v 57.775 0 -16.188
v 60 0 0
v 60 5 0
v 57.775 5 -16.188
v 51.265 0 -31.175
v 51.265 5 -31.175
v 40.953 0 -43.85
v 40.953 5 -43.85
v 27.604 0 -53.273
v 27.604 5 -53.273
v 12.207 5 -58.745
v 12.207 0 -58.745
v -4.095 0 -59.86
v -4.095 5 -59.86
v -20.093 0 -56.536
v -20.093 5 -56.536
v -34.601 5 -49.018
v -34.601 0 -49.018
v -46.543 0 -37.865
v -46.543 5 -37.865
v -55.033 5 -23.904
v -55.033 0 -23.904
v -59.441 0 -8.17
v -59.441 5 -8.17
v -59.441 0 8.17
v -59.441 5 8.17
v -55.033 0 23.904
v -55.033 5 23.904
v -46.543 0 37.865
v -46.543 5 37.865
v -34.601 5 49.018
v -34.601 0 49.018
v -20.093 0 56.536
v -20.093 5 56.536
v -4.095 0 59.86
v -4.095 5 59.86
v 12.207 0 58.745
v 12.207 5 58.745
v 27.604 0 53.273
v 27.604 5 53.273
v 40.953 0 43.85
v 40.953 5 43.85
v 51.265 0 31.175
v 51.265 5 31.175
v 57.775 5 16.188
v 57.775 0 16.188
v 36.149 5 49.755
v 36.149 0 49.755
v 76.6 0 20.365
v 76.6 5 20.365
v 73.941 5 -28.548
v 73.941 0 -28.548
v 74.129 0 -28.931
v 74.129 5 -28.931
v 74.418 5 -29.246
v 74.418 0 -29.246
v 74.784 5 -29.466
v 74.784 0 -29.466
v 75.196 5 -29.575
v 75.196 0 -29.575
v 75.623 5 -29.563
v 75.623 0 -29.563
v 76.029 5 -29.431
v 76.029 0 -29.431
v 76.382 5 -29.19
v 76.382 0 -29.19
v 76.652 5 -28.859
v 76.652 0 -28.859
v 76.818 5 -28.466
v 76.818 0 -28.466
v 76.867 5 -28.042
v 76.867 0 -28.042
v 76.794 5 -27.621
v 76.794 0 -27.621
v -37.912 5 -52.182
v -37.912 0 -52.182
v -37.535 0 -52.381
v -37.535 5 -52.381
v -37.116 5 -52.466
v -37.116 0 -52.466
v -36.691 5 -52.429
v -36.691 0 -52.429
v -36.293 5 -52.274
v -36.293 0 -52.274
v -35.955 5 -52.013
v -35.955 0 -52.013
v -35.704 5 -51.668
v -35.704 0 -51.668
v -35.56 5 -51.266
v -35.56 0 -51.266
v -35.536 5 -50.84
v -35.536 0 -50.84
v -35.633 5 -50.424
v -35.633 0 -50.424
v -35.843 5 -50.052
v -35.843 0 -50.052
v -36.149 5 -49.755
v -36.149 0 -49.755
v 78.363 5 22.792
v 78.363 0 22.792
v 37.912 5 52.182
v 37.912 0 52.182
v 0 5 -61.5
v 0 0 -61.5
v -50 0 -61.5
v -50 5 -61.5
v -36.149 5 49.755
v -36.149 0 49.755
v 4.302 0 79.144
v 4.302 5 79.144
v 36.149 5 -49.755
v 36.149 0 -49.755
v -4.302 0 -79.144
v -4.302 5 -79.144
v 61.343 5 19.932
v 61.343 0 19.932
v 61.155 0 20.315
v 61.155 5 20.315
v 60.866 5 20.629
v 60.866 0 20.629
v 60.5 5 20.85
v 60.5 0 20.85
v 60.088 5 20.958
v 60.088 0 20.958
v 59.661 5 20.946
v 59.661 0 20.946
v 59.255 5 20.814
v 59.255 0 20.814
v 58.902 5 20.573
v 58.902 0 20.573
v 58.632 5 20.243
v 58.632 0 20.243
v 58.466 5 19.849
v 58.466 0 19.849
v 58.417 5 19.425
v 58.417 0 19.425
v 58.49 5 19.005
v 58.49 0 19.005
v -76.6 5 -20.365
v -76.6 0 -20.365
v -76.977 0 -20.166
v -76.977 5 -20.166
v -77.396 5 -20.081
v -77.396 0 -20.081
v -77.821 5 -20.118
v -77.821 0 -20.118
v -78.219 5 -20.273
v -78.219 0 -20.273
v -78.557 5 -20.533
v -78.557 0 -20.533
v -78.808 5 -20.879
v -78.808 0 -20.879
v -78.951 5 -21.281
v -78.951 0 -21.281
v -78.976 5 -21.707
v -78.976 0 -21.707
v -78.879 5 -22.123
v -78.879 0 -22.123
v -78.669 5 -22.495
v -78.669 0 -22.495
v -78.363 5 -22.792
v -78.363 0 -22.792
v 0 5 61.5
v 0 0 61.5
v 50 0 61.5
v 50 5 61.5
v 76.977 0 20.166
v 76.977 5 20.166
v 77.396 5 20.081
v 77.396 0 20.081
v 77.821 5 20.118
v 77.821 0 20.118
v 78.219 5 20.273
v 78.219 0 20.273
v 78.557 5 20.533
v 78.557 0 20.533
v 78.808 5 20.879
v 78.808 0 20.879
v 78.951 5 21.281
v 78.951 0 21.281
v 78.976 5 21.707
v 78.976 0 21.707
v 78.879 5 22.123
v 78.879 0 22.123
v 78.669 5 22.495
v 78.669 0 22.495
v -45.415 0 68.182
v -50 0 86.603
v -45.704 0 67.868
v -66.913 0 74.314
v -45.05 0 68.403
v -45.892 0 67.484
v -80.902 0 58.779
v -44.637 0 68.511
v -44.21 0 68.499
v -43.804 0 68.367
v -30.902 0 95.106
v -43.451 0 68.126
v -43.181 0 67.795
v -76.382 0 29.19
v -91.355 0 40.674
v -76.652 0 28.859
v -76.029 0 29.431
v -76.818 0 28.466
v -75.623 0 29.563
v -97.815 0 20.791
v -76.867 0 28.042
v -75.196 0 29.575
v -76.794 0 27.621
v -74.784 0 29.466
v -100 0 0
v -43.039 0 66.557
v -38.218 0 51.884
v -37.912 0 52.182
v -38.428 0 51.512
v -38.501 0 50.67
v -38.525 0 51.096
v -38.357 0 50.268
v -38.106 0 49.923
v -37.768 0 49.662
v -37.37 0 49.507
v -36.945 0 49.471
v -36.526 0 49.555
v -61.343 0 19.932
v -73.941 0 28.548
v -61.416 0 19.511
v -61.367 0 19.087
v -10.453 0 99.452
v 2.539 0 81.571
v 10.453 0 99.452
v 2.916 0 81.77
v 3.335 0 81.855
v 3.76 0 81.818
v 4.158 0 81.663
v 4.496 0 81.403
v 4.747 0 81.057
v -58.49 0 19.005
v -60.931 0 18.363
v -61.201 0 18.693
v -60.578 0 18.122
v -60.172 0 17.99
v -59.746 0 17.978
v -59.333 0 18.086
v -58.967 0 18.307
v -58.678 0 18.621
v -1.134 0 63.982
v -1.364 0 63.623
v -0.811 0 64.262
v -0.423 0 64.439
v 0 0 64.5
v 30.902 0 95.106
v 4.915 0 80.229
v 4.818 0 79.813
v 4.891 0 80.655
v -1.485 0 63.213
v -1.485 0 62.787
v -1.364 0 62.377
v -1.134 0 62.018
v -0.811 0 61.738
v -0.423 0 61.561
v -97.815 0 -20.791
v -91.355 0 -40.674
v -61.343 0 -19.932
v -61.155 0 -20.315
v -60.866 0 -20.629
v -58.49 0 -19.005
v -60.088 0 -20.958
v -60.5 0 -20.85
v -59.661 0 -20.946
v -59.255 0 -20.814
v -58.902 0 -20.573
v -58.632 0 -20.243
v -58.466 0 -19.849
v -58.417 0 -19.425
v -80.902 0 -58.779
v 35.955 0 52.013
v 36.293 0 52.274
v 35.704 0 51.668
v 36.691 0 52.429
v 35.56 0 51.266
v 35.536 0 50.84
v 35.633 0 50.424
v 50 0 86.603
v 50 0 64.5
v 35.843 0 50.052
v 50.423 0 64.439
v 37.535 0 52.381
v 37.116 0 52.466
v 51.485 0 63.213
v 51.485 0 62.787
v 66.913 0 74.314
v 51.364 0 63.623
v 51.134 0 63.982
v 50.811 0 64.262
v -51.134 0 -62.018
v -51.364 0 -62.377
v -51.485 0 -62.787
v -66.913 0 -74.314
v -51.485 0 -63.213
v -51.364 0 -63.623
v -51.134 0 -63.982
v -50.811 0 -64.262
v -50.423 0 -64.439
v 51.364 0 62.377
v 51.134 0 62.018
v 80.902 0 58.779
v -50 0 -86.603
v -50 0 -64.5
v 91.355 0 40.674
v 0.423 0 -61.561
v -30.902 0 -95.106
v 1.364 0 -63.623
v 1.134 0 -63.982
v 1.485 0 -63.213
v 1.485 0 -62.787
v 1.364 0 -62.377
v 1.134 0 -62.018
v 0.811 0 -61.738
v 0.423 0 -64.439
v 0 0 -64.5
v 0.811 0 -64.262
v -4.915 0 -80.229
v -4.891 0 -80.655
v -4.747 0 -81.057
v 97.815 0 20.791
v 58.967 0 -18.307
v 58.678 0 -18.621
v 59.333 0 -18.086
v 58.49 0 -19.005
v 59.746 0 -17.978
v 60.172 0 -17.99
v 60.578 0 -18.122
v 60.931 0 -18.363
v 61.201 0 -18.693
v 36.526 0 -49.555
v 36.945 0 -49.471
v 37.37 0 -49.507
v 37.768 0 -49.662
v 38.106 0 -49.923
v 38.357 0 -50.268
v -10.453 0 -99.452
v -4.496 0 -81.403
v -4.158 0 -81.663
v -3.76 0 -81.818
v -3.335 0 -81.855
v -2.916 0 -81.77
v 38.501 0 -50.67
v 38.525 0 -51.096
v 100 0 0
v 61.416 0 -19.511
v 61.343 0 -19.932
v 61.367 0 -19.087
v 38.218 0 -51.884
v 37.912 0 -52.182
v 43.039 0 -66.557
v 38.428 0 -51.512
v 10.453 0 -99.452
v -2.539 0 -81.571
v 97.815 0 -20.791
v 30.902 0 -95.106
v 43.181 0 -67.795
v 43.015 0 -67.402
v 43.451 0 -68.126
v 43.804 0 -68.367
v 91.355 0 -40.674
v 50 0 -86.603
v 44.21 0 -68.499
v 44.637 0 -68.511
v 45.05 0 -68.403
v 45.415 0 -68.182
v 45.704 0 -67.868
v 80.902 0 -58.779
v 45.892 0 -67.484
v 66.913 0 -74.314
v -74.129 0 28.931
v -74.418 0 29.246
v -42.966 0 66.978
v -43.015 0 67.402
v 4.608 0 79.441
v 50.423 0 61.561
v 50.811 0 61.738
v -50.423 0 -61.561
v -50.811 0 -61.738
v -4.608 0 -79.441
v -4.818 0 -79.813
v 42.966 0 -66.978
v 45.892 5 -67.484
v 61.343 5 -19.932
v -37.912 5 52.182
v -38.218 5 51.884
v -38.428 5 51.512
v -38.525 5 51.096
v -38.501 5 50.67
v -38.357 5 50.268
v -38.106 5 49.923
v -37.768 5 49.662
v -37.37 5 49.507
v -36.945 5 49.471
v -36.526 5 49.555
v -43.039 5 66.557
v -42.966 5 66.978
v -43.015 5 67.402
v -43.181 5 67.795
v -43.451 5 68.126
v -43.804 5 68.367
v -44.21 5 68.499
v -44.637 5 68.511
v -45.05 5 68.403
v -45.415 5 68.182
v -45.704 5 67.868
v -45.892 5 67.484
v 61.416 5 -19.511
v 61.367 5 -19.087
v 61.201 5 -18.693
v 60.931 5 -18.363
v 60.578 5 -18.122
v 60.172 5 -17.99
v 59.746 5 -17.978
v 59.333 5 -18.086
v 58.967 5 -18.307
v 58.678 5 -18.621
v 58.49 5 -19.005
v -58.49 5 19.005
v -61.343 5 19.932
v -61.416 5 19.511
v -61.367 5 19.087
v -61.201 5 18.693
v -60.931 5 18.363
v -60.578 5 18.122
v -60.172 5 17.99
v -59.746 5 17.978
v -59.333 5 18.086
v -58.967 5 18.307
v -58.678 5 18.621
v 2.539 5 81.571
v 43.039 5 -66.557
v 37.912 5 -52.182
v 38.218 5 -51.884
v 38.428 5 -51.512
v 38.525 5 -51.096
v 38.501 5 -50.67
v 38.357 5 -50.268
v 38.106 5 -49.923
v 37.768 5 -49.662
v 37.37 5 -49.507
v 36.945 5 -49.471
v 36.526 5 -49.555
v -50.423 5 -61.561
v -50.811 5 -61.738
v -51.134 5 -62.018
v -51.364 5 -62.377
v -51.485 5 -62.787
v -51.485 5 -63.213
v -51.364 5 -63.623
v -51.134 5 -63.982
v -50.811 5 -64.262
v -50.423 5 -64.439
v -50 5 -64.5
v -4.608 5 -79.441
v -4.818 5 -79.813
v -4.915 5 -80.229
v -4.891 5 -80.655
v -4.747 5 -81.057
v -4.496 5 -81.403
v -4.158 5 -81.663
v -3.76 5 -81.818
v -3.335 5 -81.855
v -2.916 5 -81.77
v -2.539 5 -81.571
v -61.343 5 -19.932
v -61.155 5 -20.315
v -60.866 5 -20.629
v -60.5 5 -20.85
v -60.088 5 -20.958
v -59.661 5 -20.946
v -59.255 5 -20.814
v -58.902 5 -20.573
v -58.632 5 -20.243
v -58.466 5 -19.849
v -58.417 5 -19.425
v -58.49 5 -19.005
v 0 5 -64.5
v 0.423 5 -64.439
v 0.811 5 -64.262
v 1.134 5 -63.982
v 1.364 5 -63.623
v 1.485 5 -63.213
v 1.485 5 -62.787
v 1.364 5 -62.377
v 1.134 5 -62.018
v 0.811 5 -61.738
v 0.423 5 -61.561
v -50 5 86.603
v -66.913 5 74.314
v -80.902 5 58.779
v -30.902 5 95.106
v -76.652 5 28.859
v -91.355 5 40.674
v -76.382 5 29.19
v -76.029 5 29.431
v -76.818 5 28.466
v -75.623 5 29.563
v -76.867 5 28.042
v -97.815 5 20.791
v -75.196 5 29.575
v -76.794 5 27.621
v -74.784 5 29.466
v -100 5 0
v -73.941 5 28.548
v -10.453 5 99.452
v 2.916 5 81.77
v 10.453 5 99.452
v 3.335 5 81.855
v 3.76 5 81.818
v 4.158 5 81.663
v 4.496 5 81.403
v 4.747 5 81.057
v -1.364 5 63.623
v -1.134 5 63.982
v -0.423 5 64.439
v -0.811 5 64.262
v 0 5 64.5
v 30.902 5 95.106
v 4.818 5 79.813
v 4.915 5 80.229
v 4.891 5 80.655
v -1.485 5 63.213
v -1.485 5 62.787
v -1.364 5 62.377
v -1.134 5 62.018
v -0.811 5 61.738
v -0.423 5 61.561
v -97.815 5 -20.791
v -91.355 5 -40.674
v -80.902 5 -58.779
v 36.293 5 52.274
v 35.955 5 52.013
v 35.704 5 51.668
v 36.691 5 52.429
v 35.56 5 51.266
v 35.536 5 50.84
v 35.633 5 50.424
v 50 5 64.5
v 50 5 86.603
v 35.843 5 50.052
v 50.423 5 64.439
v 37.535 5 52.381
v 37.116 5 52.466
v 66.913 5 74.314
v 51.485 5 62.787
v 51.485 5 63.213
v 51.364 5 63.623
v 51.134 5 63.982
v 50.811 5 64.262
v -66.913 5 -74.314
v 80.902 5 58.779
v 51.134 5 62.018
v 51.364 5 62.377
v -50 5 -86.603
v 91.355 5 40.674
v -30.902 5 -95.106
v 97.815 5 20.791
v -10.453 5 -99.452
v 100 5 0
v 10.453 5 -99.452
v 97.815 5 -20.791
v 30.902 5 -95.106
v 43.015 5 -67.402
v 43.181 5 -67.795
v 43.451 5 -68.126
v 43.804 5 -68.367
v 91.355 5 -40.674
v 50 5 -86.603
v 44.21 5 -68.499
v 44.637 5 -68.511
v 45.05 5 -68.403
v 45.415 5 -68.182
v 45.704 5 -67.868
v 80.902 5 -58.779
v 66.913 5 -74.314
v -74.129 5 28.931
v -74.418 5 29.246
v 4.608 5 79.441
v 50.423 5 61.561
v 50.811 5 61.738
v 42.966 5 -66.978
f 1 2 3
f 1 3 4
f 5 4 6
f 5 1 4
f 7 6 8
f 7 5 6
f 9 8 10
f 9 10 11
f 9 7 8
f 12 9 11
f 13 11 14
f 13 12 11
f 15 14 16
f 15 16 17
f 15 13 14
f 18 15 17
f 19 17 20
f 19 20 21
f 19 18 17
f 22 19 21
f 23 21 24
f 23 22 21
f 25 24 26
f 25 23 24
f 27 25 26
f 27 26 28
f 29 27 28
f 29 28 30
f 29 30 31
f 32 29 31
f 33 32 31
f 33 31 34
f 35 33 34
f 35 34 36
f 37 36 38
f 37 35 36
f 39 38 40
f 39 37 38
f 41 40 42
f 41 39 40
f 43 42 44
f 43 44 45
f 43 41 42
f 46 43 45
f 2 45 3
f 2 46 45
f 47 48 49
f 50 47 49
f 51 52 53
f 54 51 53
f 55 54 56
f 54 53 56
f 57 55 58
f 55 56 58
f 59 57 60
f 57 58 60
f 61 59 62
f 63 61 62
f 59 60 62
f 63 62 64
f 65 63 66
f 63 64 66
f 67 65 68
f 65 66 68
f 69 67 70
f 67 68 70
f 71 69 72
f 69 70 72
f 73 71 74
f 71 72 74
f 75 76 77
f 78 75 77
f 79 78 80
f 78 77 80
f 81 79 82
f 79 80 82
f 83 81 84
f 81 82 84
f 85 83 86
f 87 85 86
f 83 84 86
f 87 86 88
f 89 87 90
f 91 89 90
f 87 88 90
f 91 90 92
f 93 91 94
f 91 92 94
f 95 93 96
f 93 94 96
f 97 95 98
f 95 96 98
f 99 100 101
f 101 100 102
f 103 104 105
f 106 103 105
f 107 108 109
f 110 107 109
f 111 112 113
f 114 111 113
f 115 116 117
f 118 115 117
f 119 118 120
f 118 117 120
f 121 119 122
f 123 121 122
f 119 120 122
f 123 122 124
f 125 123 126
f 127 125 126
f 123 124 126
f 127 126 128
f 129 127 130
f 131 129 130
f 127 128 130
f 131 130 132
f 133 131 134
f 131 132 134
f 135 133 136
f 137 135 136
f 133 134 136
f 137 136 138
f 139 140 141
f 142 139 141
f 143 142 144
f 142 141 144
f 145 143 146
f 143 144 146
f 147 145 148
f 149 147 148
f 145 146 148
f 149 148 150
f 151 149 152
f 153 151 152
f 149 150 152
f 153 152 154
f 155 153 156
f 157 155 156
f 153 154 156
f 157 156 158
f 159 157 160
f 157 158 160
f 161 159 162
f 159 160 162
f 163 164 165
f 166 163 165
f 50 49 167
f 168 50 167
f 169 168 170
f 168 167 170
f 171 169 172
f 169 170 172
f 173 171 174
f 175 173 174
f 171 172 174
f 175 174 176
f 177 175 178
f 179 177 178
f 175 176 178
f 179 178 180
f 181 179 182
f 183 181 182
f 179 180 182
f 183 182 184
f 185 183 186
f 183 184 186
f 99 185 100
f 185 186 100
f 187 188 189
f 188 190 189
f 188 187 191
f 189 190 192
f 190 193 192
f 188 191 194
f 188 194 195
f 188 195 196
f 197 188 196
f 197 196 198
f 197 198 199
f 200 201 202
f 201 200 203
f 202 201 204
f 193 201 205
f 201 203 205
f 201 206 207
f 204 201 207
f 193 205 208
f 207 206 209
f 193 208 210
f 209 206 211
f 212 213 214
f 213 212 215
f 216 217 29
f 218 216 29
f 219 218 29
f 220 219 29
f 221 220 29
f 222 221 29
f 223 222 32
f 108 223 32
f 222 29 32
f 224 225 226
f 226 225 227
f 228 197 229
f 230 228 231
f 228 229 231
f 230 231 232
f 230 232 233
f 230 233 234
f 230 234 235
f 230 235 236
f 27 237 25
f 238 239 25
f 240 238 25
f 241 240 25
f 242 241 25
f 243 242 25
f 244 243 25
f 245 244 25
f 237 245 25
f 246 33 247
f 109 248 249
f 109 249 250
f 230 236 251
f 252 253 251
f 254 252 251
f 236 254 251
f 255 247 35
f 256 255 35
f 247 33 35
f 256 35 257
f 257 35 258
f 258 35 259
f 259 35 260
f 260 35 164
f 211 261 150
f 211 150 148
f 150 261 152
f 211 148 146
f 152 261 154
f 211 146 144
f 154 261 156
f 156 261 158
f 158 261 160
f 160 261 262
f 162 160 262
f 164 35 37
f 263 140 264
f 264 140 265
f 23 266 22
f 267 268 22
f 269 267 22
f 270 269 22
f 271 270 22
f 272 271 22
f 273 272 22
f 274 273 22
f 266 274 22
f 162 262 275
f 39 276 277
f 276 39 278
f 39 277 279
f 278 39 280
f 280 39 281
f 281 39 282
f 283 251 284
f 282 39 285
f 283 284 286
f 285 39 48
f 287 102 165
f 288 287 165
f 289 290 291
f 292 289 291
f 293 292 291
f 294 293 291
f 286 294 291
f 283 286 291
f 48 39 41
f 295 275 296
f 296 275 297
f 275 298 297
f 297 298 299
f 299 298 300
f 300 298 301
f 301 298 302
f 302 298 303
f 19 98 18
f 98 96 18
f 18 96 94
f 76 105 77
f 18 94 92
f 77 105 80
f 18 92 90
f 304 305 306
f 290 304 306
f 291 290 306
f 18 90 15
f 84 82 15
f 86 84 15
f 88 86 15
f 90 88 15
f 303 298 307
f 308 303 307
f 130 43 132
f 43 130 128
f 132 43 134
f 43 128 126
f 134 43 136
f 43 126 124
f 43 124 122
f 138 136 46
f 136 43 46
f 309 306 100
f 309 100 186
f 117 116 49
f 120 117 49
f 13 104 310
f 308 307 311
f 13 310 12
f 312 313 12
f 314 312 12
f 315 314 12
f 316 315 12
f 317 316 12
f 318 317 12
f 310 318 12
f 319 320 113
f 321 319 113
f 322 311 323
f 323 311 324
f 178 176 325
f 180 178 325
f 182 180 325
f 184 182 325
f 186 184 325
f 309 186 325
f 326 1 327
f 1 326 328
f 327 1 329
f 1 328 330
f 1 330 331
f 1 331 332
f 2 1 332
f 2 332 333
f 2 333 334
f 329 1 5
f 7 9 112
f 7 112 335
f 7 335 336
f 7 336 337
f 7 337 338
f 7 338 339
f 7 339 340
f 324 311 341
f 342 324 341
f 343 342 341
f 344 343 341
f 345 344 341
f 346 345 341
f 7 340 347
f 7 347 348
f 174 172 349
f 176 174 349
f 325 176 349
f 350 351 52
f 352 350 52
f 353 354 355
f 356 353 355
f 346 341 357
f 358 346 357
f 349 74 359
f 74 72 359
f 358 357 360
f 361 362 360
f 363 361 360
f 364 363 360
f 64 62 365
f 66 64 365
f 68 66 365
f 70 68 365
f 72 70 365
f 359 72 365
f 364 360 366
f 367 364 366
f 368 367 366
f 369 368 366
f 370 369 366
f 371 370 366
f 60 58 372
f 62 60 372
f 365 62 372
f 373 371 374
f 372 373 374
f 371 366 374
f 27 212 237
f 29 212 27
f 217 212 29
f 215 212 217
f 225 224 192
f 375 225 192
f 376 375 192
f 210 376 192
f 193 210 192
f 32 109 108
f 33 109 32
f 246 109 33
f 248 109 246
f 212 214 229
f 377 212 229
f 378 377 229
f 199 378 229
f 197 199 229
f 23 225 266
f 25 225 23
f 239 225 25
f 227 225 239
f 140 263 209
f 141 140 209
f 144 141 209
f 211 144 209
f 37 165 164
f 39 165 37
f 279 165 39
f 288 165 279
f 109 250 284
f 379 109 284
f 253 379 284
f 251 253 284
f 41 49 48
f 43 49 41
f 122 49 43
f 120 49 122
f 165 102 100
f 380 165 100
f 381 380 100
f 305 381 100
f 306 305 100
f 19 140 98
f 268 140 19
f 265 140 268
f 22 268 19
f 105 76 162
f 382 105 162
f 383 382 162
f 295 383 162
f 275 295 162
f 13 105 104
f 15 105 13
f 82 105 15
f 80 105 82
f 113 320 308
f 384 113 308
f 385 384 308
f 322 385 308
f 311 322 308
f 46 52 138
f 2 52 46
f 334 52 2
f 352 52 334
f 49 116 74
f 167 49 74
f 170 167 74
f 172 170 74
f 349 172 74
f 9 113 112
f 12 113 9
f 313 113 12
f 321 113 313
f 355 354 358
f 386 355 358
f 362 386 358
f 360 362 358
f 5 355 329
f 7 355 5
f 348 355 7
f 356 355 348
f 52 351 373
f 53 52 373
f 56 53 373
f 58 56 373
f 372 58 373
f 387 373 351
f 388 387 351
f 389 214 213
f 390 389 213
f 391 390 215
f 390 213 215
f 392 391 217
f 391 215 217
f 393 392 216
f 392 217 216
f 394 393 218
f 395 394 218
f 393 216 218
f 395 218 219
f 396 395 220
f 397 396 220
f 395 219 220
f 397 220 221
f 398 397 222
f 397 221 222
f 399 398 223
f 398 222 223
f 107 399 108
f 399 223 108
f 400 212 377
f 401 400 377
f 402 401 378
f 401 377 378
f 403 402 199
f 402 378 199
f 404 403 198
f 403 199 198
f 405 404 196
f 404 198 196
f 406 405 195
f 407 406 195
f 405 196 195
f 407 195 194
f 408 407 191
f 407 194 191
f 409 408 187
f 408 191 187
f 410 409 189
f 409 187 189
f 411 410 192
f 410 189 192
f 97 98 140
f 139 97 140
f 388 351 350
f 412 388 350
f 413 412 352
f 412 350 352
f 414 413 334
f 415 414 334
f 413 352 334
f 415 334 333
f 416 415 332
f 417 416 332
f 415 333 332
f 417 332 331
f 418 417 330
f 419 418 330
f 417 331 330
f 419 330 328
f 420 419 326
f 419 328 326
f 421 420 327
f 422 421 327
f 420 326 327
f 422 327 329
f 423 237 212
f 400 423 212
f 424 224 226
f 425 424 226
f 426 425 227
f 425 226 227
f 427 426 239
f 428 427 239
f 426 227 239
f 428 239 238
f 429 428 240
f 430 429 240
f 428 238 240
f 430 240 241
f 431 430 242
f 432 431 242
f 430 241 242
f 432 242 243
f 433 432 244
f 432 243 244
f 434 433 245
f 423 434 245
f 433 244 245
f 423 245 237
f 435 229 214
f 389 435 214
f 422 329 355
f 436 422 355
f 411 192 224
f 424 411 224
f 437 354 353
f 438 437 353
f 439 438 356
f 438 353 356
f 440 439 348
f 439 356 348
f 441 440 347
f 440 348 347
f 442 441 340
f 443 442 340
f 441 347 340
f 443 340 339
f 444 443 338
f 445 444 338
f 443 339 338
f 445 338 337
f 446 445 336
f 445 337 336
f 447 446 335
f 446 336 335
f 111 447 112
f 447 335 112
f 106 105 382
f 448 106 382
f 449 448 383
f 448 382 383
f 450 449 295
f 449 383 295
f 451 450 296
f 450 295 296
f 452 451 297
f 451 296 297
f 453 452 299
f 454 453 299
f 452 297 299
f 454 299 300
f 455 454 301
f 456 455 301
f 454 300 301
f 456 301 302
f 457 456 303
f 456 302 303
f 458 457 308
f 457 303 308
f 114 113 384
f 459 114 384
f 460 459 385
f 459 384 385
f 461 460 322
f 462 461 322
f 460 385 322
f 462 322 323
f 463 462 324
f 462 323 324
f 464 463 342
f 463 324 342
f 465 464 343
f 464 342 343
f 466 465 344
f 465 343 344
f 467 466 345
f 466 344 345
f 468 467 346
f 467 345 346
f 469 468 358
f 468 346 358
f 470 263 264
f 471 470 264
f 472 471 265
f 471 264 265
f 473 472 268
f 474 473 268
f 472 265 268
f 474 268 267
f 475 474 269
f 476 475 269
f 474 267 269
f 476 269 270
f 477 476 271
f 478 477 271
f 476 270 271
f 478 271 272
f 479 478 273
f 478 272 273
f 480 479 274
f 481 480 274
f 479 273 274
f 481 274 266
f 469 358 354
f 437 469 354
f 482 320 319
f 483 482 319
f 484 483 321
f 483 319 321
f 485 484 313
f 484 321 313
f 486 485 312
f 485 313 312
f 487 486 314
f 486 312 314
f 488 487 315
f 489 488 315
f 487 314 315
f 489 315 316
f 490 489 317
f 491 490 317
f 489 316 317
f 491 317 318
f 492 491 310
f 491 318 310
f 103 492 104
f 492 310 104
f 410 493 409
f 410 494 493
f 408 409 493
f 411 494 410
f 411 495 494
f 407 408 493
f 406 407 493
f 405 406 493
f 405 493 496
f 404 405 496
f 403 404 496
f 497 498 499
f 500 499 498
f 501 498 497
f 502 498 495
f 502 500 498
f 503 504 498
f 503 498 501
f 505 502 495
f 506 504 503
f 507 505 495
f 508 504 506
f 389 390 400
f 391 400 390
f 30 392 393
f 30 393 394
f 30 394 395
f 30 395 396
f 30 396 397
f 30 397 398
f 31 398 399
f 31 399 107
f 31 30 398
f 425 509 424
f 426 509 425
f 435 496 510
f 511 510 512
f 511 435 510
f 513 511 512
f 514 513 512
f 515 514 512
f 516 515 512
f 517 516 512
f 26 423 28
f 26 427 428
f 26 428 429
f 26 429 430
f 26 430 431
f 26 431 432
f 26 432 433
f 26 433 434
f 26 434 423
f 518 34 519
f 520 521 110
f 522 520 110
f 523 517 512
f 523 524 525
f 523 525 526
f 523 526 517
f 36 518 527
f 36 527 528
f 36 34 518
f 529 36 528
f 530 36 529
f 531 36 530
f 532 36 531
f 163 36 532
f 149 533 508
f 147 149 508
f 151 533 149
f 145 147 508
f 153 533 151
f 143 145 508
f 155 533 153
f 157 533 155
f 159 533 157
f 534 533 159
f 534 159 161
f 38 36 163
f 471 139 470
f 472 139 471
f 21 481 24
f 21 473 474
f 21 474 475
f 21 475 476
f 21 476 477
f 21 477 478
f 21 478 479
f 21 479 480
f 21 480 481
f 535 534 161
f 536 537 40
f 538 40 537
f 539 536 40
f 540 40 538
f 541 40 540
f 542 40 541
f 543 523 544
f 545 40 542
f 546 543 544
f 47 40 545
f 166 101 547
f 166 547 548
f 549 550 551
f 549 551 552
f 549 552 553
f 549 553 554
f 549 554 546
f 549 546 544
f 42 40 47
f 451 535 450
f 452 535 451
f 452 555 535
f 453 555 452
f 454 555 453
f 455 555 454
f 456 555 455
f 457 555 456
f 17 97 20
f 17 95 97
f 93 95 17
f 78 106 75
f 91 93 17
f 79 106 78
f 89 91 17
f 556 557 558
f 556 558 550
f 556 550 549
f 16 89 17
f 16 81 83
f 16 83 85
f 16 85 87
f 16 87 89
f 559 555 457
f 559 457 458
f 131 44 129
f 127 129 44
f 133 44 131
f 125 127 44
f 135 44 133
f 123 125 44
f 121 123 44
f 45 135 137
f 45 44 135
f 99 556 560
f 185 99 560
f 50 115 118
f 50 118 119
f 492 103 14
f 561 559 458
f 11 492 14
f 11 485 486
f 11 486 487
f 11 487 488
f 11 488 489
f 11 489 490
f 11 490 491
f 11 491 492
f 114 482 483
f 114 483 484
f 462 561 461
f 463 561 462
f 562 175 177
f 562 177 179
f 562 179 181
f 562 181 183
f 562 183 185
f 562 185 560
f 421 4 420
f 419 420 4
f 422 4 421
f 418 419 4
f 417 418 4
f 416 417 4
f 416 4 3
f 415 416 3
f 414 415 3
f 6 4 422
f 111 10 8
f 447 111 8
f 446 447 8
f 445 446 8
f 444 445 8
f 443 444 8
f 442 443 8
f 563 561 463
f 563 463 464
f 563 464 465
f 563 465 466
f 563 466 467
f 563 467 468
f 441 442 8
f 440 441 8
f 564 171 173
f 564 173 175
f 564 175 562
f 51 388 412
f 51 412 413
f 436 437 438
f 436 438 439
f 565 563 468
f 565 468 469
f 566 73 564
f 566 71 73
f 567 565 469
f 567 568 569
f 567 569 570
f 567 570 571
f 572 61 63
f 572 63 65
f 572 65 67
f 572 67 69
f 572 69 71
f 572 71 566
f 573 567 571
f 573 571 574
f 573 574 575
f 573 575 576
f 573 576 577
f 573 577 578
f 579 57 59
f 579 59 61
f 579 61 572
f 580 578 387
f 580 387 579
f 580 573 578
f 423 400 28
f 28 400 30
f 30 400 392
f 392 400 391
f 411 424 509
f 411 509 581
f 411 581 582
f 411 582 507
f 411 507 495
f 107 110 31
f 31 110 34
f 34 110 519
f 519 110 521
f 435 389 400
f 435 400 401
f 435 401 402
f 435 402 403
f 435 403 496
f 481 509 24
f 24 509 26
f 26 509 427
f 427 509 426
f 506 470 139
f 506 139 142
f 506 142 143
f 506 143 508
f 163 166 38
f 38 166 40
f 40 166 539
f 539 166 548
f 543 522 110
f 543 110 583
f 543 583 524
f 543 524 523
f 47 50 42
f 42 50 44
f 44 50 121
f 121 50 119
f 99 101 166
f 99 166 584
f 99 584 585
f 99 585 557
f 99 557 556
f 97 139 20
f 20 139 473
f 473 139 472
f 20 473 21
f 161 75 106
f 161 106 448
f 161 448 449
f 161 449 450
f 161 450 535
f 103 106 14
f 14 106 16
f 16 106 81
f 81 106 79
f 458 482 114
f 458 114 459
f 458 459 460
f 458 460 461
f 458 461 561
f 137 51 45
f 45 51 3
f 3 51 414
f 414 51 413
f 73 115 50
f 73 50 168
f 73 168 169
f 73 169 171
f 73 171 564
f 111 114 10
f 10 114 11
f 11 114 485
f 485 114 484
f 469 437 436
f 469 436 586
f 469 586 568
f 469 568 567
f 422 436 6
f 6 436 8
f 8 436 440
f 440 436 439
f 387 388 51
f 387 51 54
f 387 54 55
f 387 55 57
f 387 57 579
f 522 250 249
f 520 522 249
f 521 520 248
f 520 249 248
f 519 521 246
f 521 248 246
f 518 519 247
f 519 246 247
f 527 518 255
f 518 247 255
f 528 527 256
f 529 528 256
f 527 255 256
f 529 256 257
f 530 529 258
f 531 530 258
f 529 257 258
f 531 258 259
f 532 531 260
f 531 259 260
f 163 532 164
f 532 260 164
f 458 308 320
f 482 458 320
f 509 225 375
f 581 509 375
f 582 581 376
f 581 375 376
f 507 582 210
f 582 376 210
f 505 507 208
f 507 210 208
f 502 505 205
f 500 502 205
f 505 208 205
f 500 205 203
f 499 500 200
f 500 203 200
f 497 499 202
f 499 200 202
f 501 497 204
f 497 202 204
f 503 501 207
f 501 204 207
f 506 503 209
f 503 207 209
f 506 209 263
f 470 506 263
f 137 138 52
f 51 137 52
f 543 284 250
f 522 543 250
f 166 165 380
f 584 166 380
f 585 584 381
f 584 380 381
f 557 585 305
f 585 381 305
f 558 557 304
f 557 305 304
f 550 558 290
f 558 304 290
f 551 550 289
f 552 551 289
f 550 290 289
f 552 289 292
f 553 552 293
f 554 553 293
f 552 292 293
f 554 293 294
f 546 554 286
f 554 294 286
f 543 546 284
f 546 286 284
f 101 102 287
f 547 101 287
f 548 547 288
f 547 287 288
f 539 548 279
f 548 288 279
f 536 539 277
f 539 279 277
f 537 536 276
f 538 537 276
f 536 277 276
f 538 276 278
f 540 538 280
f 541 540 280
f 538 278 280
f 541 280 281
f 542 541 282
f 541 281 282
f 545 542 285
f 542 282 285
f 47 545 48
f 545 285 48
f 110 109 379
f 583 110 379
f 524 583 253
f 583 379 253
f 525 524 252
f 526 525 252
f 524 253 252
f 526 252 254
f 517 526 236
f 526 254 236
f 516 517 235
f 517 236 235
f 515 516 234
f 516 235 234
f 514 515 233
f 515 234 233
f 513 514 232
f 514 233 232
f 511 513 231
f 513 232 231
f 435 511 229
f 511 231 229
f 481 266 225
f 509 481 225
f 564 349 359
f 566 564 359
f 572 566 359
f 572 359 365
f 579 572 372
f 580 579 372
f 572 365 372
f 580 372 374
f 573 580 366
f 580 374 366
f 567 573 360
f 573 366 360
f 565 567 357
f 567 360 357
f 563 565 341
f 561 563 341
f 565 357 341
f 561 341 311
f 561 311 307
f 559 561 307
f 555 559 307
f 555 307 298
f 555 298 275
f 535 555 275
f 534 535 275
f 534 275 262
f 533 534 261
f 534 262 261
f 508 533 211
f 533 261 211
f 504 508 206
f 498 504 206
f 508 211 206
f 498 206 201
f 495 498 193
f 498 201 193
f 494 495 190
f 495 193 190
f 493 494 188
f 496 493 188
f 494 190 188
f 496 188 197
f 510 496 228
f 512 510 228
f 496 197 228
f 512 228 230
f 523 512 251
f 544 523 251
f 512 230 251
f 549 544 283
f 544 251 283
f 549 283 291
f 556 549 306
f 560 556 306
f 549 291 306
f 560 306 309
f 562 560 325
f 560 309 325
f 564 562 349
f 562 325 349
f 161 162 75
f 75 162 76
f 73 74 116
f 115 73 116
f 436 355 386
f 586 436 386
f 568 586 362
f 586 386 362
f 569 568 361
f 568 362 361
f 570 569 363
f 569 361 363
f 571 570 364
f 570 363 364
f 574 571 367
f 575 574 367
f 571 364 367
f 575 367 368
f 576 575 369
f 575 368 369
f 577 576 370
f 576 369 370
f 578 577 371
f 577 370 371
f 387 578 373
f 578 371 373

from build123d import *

# Parameters (mm, degrees)
SKETCH1_R           = 100
SKETCH1_R_2         = 60
BOSS_EXTRUDE1_DEPTH = 5


with BuildPart() as part:
    # Sketch1 → Boss-Extrude1 (new body)
    with BuildSketch(Plane(origin=(0, 0, 0), x_dir=(1, 0, 0), z_dir=(0, 1, 0))):
        Circle(SKETCH1_R)
        Circle(SKETCH1_R_2, mode=Mode.SUBTRACT)
        with BuildLine():
            Line((0, 61.5), (-50, 61.5))
            ThreePointArc((-50, 61.5), (-51.5, 63), (-50, 64.5))
            Line((-50, 64.5), (0, 64.5))
            ThreePointArc((0, 64.5), (1.5, 63), (0, 61.5))
        make_face(mode=Mode.SUBTRACT)
        with BuildLine():
            Line((36.148793016, 49.754545154), (-4.302056703, 79.143807769))
            ThreePointArc((-4.302056703, 79.143807769), (-4.633904316, 81.239011139), (-2.538700946, 81.570858752))
            Line((-2.538700946, 81.570858752), (37.912148773, 52.181596137))
            ThreePointArc((37.912148773, 52.181596137), (38.243996386, 50.086392767), (36.148793016, 49.754545154))
        make_face(mode=Mode.SUBTRACT)
        with BuildLine():
            Line((58.489975752, 19.004545154), (43.039126033, 66.557370969))
            ThreePointArc((43.039126033, 66.557370969), (44.002185316, 68.447481235), (45.892295582, 67.484421952))
            Line((45.892295582, 67.484421952), (61.343145301, 19.931596137))
            ThreePointArc((61.343145301, 19.931596137), (60.380086018, 18.041485871), (58.489975752, 19.004545154))
        make_face(mode=Mode.SUBTRACT)
        with BuildLine():
            Line((58.489975752, -19.004545154), (73.940825471, 28.548280661))
            ThreePointArc((73.940825471, 28.548280661), (75.830935737, 29.511339944), (76.79399502, 27.621229678))
            Line((76.79399502, 27.621229678), (61.343145301, -19.931596137))
            ThreePointArc((61.343145301, -19.931596137), (59.453035035, -20.89465542), (58.489975752, -19.004545154))
        make_face(mode=Mode.SUBTRACT)
        with BuildLine():
            Line((36.148793016, -49.754545154), (76.599642735, -20.365282539))
            ThreePointArc((76.599642735, -20.365282539), (78.694846105, -20.697130153), (78.362998492, -22.792333523))
            Line((78.362998492, -22.792333523), (37.912148773, -52.181596137))
            ThreePointArc((37.912148773, -52.181596137), (35.816945403, -51.849748524), (36.148793016, -49.754545154))
        make_face(mode=Mode.SUBTRACT)
        with BuildLine():
            Line((0, -61.5), (50, -61.5))
            ThreePointArc((50, -61.5), (51.5, -63), (50, -64.5))
            Line((50, -64.5), (0, -64.5))
            ThreePointArc((0, -64.5), (-1.5, -63), (0, -61.5))
        make_face(mode=Mode.SUBTRACT)
        with BuildLine():
            Line((-36.148793016, -49.754545154), (4.302056703, -79.143807769))
            ThreePointArc((4.302056703, -79.143807769), (4.633904316, -81.239011139), (2.538700946, -81.570858752))
            Line((2.538700946, -81.570858752), (-37.912148773, -52.181596137))
            ThreePointArc((-37.912148773, -52.181596137), (-38.243996386, -50.086392767), (-36.148793016, -49.754545154))
        make_face(mode=Mode.SUBTRACT)
        with BuildLine():
            Line((-58.489975752, -19.004545154), (-43.039126033, -66.557370969))
            ThreePointArc((-43.039126033, -66.557370969), (-44.002185316, -68.447481235), (-45.892295582, -67.484421952))
            Line((-45.892295582, -67.484421952), (-61.343145301, -19.931596137))
            ThreePointArc((-61.343145301, -19.931596137), (-60.380086018, -18.041485871), (-58.489975752, -19.004545154))
        make_face(mode=Mode.SUBTRACT)
        with BuildLine():
            Line((-58.489975752, 19.004545154), (-73.940825471, -28.548280661))
            ThreePointArc((-73.940825471, -28.548280661), (-75.830935737, -29.511339944), (-76.79399502, -27.621229678))
            Line((-76.79399502, -27.621229678), (-61.343145301, 19.931596137))
            ThreePointArc((-61.343145301, 19.931596137), (-59.453035035, 20.89465542), (-58.489975752, 19.004545154))
        make_face(mode=Mode.SUBTRACT)
        with BuildLine():
            Line((-36.148793016, 49.754545154), (-76.599642735, 20.365282539))
            ThreePointArc((-76.599642735, 20.365282539), (-78.694846105, 20.697130153), (-78.362998492, 22.792333523))
            Line((-78.362998492, 22.792333523), (-37.912148773, 52.181596137))
            ThreePointArc((-37.912148773, 52.181596137), (-35.816945403, 51.849748524), (-36.148793016, 49.754545154))
        make_face(mode=Mode.SUBTRACT)
    extrude(amount=BOSS_EXTRUDE1_DEPTH)


solid = part.part
